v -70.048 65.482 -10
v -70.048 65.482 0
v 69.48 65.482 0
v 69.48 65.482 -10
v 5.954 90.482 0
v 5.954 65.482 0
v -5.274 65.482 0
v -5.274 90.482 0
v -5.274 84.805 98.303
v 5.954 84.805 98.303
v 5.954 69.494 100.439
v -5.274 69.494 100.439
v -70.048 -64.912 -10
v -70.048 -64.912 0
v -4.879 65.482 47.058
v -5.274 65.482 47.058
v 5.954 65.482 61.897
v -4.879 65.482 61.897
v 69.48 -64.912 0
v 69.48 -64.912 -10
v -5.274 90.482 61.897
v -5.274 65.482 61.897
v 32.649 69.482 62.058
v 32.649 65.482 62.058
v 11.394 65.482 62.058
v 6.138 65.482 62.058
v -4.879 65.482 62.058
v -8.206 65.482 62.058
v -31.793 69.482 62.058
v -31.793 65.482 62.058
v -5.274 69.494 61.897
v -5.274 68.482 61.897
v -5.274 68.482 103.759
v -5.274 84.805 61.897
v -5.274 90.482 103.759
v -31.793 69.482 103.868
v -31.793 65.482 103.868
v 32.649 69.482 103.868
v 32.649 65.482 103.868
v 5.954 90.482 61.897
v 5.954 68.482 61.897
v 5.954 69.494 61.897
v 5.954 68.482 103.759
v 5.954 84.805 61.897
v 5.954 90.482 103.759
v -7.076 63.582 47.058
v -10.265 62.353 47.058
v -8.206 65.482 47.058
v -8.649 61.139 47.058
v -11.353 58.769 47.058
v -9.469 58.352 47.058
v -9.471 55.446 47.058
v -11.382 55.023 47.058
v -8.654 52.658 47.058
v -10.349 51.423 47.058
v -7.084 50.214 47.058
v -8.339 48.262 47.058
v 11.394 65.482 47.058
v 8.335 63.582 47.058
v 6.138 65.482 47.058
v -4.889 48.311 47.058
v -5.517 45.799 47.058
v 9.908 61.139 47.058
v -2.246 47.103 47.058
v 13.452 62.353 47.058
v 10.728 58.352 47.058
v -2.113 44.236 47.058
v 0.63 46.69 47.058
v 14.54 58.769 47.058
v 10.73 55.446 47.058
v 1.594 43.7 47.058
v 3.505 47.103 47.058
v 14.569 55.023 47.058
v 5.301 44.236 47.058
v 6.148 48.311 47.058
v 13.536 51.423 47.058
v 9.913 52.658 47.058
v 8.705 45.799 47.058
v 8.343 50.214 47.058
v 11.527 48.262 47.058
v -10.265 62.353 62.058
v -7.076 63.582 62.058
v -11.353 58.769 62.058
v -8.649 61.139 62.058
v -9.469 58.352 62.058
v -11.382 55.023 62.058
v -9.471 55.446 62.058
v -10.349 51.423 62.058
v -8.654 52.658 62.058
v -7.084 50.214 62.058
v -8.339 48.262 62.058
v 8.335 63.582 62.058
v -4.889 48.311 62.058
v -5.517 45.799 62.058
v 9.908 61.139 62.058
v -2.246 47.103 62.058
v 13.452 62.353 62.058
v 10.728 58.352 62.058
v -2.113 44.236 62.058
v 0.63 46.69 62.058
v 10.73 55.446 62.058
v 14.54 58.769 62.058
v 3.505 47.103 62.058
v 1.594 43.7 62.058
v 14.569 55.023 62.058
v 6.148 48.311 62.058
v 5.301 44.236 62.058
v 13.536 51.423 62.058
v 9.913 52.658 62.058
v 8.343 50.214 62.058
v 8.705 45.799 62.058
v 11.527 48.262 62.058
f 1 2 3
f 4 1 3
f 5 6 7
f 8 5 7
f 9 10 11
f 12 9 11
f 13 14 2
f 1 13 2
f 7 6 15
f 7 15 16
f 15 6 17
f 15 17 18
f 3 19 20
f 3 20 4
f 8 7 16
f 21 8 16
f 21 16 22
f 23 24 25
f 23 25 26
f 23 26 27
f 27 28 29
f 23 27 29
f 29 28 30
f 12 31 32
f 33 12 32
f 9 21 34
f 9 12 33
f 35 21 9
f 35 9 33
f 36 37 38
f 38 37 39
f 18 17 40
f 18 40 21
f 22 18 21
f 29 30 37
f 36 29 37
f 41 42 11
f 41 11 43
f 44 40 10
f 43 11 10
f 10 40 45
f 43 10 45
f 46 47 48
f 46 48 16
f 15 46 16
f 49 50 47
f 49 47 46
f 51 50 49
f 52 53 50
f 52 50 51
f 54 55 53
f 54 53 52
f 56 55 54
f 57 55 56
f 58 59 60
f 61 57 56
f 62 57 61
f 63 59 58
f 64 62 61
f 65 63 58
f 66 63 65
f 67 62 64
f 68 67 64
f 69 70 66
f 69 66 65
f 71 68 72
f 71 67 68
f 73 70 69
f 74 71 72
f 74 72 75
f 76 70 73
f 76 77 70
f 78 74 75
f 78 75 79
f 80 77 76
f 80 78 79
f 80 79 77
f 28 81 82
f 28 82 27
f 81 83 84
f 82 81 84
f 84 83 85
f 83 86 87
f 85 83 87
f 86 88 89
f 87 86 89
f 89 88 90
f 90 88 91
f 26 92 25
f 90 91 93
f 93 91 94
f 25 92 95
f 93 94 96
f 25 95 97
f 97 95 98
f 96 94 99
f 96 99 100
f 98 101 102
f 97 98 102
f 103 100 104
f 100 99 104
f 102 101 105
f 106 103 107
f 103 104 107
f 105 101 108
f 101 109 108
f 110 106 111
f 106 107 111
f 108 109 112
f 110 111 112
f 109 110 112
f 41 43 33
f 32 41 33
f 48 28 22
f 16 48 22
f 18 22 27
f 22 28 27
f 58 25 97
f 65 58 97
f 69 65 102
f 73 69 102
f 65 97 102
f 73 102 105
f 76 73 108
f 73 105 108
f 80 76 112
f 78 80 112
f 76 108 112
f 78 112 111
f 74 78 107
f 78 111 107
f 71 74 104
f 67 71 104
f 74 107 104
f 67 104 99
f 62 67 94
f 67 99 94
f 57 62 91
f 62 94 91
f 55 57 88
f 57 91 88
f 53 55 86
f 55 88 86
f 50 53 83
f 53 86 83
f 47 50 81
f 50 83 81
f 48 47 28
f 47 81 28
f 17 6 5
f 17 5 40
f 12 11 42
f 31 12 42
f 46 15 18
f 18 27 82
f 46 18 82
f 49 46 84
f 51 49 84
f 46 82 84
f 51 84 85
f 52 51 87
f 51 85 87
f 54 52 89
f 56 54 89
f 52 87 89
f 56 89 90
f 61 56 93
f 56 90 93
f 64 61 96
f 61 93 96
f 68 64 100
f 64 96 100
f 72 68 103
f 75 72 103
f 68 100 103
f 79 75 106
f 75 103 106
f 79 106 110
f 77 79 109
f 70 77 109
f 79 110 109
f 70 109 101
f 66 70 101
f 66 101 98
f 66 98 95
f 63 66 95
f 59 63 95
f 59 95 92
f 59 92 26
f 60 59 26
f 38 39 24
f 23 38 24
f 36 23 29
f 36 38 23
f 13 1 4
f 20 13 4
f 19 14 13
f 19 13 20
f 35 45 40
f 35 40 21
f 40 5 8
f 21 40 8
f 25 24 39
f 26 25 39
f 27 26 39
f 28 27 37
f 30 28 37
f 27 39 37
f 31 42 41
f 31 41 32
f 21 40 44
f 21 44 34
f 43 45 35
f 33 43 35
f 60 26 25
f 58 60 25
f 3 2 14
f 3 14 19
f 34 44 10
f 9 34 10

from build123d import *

# Parameters (mm, degrees)
F0_W      = 139.5270854934
F0_H      = 130.3940266371
F1_DEPTH  = 10
F3_DEPTH  = 4
F4_W      = 11.2278764136
F4_H      = 61.8974082172
F5_DEPTH  = 25
F6_W      = 11.2278764136
F6_H      = 41.8618817022
F7_DEPTH  = 22
F9_DEPTH  = 25
F11_DEPTH = 15
F13_DEPTH = 25


with BuildPart() as f1:
    # F0 (on Top) → F1 (new body)
    with BuildSketch(Plane.XY):
        with Locations((-0.2840146073, 0.2853274345)):
            Rectangle(F0_W, F0_H)
    extrude(amount=-F1_DEPTH)


with BuildPart() as f3:
    # F2 (on face) → F3 (new body)
    with BuildSketch(Plane(origin=(0, 65.4823407531, 0), x_dir=(-1, 0, 0), z_dir=(0, 1, 0))):
        Polygon((-32.6489694417, 62.0584264398), (-6.1345105059, 62.0584264398), (5.2785333246, 62.0584264398), (31.7929922603, 62.0584264398), (31.7929922603, 103.8682609797), (-32.6489694417, 103.8682609797), align=None)
    extrude(amount=F3_DEPTH)



with BuildPart() as f5:
    # F4 (on face) → F5 (new body)
    with BuildSketch(Plane(origin=(0, 65.4823407531, 0), x_dir=(-1, 0, 0), z_dir=(0, 1, 0))):
        with Locations((-0.3402393777, 30.9487041086)):
            Rectangle(F4_W, F4_H)
    extrude(amount=F5_DEPTH)


with BuildPart() as f7:
    # F6 (on face) → F7 (new body)
    with BuildSketch(Plane(origin=(0, 90.4823407531, 0), x_dir=(-1, 0, 0), z_dir=(0, 1, 0))):
        with Locations((-0.3402393777, 82.8283490683)):
            Rectangle(F6_W, F6_H)
    extrude(amount=-F7_DEPTH)

    # F8 (on face) → F9 (cut)
    with BuildSketch(Plane.YZ.offset(5.9541775845)):
        Polygon((84.8051980138, 61.8974082172), (84.8051980138, 98.3029305935), (69.4944635034, 100.4393099771), (69.4944635034, 61.8974082172), align=None)
    extrude(amount=-F9_DEPTH, mode=Mode.SUBTRACT)


with BuildPart() as f3_1:
    add(f3.part)

    add(f5.part)  # F11 merges F5
    # F10 (on face) → F11 (join)
    with BuildSketch(Plane(origin=(0, 0, 62.0584264398), x_dir=(1, 0, 0), z_dir=(0, 0, -1))):
        with BuildLine():
            Line((-8.2063768059, -65.4823407531), (11.3937389106, -65.4823407531))
            ThreePointArc((11.3937389106, -65.4823407531), (1.5936810523, -43.7000604931), (-8.2063768059, -65.4823407531))
        make_face()
    extrude(amount=F11_DEPTH)

    # F12 (on face) → F13 (cut)
    with BuildSketch(Plane.XY.offset(62.0584264398)):
        with BuildLine():
            Line((6.1381380074, 65.4823407531), (-4.8790327273, 65.4823407531))
            ThreePointArc((-4.8790327273, 65.4823407531), (0.62955264, 46.6897500929), (6.1381380074, 65.4823407531))
        make_face()
    extrude(amount=-F13_DEPTH, mode=Mode.SUBTRACT)


solid = Compound([f1.part, f7.part, f3_1.part])
